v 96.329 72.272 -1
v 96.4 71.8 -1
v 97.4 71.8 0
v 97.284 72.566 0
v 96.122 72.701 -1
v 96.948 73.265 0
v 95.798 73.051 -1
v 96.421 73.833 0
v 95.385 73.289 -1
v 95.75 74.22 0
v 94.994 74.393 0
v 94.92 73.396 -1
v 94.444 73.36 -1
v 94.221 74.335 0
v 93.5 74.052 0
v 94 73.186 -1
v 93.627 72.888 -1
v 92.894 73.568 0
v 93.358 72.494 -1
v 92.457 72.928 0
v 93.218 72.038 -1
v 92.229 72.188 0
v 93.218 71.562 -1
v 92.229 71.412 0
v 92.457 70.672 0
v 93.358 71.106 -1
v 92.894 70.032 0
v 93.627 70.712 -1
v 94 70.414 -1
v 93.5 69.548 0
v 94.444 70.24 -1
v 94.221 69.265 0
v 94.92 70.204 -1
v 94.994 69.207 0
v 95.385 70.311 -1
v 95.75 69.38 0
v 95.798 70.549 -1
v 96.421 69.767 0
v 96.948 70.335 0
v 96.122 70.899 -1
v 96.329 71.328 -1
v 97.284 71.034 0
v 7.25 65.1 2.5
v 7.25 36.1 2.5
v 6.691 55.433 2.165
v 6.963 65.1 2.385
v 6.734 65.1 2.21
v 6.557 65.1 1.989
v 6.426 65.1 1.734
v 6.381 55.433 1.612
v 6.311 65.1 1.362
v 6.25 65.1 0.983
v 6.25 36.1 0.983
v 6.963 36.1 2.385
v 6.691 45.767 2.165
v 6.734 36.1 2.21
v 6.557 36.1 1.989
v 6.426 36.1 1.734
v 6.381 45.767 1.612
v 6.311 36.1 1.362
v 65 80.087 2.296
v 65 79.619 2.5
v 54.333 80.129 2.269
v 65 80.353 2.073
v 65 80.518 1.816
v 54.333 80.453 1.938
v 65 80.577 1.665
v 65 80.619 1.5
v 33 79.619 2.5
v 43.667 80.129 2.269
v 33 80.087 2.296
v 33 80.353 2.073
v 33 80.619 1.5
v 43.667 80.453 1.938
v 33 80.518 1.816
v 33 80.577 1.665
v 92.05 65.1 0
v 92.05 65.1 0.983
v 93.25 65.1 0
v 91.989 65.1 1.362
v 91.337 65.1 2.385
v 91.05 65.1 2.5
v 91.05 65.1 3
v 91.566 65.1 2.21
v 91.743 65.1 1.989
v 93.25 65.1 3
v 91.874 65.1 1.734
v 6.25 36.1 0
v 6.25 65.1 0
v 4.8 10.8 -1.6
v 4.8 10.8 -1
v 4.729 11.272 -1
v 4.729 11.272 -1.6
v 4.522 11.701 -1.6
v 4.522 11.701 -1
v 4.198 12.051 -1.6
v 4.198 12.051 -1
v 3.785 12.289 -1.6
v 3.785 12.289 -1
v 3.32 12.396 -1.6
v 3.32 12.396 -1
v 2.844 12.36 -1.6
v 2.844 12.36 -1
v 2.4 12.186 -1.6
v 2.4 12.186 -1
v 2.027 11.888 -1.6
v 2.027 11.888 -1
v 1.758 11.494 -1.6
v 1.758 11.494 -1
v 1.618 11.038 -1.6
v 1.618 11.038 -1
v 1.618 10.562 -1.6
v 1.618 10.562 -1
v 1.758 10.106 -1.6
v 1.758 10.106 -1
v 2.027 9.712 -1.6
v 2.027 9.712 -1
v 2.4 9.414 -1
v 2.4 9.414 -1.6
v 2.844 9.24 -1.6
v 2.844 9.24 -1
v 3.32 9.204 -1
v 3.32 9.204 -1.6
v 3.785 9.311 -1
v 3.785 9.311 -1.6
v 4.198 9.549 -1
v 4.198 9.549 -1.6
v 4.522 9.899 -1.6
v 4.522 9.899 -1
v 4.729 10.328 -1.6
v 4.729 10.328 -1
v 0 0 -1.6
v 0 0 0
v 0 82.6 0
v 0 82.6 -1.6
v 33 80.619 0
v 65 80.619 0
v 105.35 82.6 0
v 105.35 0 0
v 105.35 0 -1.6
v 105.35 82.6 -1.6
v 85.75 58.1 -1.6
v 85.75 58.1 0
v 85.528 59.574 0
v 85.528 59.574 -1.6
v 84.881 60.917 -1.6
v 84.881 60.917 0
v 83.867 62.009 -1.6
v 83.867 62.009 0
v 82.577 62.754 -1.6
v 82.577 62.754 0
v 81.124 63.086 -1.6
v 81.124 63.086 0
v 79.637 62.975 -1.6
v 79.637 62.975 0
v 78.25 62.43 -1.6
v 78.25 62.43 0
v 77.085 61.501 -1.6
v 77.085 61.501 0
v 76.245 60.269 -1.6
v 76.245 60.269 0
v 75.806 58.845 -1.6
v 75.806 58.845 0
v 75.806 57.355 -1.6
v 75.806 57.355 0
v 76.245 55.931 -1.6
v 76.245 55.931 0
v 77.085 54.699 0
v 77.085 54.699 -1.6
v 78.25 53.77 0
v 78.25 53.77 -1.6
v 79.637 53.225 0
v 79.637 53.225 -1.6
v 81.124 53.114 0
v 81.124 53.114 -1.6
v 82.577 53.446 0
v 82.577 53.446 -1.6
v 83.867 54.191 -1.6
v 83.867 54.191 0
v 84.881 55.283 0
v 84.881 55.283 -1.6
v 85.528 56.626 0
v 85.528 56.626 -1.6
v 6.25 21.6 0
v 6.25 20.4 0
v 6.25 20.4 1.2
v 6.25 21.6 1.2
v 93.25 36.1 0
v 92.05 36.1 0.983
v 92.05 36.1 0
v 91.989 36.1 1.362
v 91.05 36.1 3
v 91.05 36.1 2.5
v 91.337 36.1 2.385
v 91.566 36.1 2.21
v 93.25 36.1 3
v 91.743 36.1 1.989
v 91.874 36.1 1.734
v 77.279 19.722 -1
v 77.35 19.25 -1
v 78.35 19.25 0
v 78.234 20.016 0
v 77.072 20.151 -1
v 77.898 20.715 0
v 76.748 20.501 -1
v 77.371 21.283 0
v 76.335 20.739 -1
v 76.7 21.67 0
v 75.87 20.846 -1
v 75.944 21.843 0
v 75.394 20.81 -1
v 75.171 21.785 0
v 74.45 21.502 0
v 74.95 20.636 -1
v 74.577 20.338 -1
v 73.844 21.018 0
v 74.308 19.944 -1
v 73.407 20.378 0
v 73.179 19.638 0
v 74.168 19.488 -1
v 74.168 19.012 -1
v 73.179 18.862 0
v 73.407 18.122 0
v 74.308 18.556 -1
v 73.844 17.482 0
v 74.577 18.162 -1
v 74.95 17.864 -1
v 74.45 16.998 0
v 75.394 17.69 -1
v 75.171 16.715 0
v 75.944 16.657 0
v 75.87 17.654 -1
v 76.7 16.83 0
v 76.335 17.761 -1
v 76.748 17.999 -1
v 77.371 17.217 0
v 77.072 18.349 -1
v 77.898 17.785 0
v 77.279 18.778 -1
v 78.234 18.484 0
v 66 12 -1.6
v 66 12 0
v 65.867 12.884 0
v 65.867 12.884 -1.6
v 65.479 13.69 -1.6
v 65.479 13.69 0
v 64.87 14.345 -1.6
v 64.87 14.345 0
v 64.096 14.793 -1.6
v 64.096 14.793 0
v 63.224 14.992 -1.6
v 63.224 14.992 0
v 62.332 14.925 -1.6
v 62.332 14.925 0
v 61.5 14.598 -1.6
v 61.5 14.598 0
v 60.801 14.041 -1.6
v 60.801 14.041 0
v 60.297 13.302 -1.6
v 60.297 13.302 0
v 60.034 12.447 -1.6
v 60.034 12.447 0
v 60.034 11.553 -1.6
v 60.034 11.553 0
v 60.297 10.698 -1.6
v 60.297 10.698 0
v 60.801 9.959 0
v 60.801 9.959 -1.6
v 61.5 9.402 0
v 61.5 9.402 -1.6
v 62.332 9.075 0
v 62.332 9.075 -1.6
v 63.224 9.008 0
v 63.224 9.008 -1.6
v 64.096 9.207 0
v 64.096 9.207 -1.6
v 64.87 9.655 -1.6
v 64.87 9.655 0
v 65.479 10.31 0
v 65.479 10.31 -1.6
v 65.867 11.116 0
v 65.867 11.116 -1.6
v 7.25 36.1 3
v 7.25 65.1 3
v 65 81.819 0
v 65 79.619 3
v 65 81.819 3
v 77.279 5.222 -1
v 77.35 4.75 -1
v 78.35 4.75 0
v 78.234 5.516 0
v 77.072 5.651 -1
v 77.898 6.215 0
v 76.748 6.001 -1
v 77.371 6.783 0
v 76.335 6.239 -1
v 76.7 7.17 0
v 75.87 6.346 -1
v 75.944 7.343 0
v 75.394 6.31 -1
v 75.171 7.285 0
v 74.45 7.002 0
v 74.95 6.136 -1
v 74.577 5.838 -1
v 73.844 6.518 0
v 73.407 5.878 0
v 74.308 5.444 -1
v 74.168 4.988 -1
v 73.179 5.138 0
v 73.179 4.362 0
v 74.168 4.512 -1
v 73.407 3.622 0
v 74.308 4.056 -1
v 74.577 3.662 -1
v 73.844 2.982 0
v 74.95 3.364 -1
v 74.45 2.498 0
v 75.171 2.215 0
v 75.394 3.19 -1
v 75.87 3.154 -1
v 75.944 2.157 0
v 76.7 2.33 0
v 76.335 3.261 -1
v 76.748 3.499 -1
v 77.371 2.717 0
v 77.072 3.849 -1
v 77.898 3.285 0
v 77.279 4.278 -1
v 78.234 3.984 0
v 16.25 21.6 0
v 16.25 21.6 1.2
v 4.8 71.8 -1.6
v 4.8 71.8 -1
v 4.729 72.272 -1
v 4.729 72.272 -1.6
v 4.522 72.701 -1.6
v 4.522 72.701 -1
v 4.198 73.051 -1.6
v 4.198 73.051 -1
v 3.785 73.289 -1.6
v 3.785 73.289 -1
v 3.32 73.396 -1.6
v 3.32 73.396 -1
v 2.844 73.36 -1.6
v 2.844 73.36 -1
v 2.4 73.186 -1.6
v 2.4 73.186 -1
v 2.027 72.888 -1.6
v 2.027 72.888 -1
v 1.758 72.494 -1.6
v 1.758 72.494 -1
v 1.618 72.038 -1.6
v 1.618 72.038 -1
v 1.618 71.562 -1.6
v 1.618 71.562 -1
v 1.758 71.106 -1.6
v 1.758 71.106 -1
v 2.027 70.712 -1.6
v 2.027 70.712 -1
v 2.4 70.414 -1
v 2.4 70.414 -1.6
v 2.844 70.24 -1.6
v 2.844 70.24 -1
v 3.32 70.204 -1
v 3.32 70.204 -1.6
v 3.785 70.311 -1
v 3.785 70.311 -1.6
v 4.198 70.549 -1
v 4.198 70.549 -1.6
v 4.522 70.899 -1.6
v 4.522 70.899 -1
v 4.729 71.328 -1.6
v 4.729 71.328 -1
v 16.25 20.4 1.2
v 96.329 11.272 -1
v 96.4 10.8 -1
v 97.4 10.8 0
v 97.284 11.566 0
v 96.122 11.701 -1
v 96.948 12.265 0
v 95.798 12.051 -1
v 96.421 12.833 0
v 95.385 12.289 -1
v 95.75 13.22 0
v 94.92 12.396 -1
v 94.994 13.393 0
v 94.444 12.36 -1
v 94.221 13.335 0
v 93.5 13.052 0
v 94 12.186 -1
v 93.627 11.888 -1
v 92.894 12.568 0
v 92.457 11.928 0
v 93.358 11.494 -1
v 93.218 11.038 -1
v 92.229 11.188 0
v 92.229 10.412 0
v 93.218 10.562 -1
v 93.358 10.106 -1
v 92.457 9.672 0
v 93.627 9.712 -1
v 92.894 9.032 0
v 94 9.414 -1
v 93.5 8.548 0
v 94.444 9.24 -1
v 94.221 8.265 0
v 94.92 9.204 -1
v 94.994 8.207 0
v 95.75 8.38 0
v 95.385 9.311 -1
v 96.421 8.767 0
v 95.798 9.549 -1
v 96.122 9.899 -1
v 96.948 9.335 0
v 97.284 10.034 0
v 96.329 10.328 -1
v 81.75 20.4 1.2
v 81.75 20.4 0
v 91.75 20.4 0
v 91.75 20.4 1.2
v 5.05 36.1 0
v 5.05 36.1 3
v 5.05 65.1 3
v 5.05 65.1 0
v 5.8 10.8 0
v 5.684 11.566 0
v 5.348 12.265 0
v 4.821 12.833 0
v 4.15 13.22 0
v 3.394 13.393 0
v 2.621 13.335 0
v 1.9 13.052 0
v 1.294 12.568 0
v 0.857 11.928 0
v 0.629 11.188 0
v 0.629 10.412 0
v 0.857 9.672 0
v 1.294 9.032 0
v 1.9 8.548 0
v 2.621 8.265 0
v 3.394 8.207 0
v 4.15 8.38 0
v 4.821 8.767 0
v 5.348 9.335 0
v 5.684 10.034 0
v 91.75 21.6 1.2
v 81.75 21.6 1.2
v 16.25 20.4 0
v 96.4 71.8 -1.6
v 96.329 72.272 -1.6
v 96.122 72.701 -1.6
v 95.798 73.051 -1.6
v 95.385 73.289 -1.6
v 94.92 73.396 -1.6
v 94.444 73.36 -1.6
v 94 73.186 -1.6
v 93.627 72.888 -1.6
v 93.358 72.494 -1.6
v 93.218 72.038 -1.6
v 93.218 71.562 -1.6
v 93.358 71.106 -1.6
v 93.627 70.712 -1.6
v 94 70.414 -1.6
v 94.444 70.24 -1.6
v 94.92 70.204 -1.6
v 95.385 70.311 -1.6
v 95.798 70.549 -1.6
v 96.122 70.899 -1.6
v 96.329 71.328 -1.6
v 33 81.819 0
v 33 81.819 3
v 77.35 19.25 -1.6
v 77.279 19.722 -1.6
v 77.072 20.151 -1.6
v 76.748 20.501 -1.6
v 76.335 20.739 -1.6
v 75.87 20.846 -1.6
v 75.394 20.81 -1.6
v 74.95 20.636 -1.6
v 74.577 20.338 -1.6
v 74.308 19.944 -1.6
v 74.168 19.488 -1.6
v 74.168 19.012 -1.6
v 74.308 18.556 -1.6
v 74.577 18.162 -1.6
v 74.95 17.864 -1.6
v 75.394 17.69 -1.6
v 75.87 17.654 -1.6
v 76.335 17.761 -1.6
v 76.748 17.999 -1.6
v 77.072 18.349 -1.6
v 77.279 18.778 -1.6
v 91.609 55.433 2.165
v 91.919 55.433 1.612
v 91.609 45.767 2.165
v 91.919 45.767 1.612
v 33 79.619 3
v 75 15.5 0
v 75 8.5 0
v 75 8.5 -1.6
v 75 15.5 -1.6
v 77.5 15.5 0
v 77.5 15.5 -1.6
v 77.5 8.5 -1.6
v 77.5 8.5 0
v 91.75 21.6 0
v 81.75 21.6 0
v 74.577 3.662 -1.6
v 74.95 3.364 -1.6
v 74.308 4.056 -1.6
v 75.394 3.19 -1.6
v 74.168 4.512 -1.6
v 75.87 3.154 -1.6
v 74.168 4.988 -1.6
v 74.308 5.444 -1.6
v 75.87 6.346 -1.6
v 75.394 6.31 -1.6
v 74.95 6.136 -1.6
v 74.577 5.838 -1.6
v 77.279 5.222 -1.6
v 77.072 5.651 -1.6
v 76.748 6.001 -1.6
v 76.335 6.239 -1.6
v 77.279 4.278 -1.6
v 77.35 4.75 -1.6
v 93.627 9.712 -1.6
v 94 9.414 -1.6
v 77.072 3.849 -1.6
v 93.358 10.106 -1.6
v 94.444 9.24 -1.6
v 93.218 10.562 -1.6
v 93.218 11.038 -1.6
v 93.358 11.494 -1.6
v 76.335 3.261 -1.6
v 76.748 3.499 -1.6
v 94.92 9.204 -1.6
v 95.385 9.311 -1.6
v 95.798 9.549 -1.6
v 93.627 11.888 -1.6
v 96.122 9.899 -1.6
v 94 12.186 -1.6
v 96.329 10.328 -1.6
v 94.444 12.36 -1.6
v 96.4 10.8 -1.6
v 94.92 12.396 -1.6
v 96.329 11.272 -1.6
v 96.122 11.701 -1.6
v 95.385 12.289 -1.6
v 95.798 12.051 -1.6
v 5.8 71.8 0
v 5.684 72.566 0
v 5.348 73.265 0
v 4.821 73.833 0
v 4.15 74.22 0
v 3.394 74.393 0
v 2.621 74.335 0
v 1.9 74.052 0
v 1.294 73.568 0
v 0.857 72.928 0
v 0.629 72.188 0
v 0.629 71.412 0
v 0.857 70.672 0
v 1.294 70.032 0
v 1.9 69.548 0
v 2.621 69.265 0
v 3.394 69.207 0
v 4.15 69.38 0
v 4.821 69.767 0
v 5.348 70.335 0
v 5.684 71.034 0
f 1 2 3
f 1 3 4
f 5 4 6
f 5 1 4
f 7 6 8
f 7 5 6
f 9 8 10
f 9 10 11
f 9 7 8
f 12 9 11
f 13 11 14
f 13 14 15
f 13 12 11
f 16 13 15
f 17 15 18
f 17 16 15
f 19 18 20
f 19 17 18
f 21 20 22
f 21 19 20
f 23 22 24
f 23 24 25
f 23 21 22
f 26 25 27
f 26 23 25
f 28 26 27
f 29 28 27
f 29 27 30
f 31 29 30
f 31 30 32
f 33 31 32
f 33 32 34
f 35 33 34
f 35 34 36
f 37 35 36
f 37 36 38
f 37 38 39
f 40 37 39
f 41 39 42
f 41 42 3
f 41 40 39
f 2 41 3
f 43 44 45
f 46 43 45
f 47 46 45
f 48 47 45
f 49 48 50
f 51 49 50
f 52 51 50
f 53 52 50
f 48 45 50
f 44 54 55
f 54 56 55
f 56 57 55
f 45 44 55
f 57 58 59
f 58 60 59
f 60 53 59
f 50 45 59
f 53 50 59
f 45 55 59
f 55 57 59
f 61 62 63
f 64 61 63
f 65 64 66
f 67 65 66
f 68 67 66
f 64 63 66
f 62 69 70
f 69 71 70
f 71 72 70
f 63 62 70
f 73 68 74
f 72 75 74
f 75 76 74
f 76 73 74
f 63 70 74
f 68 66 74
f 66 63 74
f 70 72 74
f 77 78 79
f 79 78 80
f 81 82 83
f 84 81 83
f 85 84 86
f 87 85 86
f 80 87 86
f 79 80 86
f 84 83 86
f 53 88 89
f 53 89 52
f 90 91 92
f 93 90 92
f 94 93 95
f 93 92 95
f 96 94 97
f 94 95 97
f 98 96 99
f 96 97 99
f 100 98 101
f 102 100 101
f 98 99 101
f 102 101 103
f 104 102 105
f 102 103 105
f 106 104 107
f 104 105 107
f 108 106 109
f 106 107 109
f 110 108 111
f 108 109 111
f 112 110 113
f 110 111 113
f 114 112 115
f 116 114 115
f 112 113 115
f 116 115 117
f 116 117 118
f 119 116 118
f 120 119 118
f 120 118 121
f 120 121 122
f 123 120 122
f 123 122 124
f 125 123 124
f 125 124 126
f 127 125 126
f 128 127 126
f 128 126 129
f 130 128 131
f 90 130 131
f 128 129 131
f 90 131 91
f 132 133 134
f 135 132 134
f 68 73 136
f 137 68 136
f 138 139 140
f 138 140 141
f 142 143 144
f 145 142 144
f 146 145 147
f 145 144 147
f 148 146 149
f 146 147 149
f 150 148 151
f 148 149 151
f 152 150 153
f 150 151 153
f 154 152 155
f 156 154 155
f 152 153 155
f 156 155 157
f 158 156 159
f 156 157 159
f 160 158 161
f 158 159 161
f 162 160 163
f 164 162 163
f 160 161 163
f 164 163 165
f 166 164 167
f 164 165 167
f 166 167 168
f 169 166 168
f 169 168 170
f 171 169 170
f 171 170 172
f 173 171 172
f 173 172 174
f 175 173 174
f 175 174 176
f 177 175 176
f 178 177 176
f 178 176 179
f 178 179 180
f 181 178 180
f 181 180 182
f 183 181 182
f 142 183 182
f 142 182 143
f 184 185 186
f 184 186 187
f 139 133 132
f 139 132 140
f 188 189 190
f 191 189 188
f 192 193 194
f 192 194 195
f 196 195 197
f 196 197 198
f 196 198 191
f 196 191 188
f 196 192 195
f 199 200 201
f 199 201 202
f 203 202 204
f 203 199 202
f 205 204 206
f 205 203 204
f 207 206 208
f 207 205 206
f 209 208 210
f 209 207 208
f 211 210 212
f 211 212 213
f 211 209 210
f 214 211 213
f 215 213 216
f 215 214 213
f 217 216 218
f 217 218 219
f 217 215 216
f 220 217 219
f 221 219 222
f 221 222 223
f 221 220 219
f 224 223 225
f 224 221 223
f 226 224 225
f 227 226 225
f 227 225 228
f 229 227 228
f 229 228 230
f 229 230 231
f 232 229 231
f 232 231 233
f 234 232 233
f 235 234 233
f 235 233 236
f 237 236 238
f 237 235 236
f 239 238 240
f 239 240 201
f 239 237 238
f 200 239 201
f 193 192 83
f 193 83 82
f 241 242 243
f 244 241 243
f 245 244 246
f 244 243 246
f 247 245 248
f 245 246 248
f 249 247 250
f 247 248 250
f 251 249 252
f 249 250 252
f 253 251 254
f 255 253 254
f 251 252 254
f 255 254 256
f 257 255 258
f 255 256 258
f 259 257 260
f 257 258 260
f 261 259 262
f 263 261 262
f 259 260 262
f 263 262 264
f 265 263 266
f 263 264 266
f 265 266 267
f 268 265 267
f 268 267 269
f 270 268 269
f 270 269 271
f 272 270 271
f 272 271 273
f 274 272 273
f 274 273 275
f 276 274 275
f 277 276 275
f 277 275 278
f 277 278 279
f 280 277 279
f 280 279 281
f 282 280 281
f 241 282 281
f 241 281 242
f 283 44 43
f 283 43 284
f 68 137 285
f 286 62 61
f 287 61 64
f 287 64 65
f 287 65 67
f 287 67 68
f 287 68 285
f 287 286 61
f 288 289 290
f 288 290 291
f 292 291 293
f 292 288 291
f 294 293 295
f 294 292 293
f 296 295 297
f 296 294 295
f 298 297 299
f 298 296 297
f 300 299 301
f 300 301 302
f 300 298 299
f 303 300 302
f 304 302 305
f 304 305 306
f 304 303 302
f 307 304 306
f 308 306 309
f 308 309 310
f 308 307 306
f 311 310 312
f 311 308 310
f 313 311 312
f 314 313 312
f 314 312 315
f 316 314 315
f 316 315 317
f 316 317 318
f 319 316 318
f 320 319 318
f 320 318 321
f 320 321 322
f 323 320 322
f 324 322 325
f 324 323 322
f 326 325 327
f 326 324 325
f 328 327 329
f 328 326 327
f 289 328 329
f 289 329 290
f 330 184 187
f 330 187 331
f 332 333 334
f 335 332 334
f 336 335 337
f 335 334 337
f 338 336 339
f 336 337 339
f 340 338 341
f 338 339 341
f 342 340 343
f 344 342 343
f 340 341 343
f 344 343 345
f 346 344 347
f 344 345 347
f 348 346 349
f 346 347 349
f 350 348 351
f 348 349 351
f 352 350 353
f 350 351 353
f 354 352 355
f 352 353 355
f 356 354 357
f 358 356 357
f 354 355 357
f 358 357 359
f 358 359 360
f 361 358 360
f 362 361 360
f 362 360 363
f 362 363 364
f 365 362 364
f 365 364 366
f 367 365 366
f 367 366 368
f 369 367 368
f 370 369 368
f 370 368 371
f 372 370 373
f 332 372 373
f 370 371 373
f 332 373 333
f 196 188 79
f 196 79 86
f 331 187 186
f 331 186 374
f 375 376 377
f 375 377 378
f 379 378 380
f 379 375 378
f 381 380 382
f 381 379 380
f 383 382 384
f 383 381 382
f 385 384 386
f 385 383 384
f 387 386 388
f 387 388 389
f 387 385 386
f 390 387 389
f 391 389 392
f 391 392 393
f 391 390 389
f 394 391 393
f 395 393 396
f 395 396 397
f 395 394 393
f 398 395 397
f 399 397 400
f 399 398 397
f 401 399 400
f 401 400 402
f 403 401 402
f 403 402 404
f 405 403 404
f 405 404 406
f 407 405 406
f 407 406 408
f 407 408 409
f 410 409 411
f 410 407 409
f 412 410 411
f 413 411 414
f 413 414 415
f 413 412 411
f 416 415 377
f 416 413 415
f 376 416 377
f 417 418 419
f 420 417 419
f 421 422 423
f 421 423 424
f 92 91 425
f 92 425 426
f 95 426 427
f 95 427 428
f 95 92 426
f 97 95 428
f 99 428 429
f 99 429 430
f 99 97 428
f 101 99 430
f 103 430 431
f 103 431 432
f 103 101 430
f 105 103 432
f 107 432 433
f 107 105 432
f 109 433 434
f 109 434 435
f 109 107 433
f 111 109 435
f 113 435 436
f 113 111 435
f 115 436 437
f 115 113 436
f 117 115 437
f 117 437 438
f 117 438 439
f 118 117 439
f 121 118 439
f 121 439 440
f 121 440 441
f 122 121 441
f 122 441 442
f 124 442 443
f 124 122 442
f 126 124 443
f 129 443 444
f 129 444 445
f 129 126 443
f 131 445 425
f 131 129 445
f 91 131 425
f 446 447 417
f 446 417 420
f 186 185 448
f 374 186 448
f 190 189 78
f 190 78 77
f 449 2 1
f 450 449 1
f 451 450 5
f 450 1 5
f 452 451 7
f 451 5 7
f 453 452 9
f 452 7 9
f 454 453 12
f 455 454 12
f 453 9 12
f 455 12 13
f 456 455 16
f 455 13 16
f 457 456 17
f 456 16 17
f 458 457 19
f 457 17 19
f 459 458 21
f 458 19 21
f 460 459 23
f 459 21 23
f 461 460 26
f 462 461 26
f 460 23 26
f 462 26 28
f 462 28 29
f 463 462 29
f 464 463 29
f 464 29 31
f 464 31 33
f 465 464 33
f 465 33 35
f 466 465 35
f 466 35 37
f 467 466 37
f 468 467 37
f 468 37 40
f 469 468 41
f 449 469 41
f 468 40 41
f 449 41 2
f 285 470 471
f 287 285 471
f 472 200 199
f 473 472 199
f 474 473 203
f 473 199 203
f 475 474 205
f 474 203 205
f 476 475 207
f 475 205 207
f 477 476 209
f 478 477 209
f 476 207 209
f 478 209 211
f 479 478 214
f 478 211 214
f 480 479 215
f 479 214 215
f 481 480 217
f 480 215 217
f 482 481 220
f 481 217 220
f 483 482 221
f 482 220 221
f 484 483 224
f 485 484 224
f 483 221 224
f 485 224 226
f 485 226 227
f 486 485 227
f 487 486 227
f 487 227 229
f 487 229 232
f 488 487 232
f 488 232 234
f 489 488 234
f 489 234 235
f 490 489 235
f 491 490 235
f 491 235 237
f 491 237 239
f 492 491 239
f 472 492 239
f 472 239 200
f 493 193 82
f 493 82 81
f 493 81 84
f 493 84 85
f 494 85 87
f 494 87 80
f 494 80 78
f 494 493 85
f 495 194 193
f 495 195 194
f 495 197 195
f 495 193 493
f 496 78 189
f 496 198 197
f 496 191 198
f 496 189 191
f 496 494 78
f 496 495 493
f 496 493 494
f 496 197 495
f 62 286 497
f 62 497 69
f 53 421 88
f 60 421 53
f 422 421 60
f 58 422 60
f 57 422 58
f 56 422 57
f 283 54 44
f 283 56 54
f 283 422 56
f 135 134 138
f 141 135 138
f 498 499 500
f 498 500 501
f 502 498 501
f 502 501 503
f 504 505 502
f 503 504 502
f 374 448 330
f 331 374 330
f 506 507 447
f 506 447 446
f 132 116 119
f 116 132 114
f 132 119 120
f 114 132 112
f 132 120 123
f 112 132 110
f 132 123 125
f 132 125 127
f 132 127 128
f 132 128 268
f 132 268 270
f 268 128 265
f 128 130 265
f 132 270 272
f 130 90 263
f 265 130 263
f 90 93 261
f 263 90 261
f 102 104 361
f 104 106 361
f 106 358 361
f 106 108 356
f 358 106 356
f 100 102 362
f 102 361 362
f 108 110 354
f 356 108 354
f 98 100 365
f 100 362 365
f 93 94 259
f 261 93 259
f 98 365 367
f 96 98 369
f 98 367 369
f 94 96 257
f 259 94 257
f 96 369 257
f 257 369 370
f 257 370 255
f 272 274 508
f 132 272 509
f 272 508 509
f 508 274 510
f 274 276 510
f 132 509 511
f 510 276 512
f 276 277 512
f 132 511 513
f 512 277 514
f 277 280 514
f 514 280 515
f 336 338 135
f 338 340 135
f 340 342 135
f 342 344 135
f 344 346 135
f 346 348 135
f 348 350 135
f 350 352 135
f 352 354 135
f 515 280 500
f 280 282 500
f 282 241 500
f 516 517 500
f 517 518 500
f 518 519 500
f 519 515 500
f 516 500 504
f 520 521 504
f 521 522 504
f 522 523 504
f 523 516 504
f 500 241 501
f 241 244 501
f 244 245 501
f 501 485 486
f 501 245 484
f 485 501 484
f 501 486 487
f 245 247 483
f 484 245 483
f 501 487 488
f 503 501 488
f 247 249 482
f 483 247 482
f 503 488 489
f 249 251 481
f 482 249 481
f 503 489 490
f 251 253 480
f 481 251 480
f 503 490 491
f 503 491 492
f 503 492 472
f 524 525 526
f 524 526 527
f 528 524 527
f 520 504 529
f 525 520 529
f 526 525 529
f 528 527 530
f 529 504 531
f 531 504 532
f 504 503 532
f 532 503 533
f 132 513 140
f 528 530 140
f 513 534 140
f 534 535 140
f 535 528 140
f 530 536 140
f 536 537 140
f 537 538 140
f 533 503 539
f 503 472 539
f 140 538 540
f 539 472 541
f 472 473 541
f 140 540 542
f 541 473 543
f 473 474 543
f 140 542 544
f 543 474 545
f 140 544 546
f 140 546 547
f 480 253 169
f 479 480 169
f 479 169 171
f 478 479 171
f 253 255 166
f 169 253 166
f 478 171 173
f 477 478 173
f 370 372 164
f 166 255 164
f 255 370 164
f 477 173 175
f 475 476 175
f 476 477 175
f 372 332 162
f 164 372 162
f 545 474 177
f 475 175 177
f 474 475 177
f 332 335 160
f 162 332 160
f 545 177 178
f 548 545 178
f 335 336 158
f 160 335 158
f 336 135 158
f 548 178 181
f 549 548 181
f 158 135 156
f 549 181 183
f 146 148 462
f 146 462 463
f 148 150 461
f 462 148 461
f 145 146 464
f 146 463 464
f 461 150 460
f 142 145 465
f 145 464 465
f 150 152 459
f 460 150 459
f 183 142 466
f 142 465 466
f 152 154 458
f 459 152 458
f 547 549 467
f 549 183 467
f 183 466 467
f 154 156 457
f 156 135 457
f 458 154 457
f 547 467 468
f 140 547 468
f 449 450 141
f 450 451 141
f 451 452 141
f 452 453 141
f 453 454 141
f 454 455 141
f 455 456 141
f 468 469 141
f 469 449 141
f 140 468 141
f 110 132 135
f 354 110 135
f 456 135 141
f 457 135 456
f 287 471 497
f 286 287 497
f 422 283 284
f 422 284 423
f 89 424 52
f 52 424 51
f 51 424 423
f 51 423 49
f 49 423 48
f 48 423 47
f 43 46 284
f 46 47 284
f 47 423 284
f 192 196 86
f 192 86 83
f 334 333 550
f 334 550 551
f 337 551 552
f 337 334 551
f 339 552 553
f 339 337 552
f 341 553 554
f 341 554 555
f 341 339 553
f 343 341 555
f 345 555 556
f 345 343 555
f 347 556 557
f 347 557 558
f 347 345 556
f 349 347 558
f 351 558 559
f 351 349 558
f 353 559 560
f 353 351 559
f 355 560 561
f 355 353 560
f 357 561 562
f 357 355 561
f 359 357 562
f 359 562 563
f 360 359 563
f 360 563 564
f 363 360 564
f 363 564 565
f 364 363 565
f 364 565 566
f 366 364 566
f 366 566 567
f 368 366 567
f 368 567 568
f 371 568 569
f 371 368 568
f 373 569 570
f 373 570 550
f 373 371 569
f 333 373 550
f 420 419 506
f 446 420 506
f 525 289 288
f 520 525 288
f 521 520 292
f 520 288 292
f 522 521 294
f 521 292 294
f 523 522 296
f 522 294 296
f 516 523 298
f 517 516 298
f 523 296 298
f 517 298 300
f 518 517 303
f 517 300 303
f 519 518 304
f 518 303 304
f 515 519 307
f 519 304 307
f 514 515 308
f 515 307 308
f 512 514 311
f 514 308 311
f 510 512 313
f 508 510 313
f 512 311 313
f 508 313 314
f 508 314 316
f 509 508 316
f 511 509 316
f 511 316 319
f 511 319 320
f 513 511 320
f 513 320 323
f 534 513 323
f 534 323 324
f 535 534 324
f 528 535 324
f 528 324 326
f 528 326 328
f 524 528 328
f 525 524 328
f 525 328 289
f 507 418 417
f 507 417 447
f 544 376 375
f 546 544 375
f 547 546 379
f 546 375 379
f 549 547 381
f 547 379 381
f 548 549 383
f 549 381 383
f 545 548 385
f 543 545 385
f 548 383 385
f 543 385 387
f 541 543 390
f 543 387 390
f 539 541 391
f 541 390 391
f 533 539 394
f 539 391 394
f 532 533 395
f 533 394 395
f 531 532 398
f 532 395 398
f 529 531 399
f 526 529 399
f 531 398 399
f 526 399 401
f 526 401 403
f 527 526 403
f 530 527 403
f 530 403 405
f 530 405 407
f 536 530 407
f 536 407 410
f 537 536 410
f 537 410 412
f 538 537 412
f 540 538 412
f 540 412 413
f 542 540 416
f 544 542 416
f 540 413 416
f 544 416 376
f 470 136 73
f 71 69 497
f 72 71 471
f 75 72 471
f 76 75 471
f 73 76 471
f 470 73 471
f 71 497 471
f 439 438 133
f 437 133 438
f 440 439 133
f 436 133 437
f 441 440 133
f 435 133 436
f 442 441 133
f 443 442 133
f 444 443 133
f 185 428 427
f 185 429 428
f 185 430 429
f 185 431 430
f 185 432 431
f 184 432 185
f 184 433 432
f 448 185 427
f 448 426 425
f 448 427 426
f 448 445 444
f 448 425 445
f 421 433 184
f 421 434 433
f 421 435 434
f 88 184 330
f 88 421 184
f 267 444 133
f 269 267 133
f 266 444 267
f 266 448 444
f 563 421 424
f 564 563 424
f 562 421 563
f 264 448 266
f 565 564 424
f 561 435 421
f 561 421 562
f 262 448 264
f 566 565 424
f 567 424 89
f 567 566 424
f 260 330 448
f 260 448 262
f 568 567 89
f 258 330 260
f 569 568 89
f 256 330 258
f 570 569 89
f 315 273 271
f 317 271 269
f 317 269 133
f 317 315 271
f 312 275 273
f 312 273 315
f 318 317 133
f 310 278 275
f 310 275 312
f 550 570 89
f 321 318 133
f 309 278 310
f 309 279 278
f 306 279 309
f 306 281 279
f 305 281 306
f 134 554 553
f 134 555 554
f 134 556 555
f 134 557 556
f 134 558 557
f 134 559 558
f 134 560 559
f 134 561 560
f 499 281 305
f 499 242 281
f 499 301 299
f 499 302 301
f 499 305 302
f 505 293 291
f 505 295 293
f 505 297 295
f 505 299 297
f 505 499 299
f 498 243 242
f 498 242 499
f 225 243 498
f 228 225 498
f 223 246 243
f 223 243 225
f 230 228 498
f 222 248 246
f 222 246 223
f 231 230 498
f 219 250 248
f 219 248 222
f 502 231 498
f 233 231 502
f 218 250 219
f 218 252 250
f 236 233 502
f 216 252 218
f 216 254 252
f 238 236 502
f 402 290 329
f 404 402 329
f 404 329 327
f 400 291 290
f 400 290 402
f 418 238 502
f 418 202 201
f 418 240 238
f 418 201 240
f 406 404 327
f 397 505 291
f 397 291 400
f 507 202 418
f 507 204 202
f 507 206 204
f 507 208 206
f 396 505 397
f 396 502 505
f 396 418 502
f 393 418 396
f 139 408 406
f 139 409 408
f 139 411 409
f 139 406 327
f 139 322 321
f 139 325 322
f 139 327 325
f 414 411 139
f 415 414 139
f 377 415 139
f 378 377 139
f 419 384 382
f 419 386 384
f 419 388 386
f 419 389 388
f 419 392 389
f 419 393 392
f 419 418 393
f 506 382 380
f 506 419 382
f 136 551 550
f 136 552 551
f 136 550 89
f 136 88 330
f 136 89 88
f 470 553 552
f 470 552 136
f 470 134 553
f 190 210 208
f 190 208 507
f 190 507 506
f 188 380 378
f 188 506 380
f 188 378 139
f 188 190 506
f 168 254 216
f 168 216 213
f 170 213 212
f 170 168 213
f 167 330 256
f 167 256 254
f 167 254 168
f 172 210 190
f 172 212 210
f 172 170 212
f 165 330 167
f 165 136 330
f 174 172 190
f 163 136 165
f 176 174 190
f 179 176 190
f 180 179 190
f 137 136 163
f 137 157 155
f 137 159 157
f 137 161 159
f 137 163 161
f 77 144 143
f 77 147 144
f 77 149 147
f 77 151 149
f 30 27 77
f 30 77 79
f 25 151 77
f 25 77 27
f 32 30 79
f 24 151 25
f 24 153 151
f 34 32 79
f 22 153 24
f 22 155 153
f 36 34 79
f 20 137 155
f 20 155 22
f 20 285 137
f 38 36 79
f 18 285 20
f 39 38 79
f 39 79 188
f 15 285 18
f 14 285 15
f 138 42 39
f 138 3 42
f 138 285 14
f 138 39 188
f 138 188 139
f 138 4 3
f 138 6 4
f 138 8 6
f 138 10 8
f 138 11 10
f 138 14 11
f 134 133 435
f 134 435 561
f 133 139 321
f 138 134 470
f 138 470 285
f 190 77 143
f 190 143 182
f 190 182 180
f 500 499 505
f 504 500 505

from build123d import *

# Parameters (mm, degrees)
F0_W      = 105.35
F0_H      = 82.6
F0_R      = 1.6
F3_DEPTH  = 1.6
F1_R      = 5
F4_DEPTH  = 1.601
F2_R      = 1.6
F2_R_2    = 3
F2_W      = 2.5
F2_H      = 7
F5_DEPTH  = 1.601
F7_START  = -36.1
F7_DEPTH  = 29
F9_START  = 33
F9_DEPTH  = 32
F1_W      = 10
F1_H      = 1.2
F10_DEPTH = 1.2
F11_SIZE  = 1


with BuildPart() as f3:
    # F0 (on Top) → F3 (new body)
    with BuildSketch(Plane.XY):
        with Locations((52.675, 41.3)):
            Rectangle(F0_W, F0_H)
        with Locations((3.2, 10.8)):
            Circle(F0_R, mode=Mode.SUBTRACT)
        with Locations((94.8, 10.8)):
            Circle(F0_R, mode=Mode.SUBTRACT)
        with Locations((3.2, 71.8)):
            Circle(F0_R, mode=Mode.SUBTRACT)
        with Locations((94.8, 71.8)):
            Circle(F0_R, mode=Mode.SUBTRACT)
    extrude(amount=-F3_DEPTH)

    # F1 (on face) → F4 (cut, through all)
    with BuildSketch(Plane.XY):
        with Locations((80.75, 58.1)):
            Circle(F1_R)
    extrude(amount=-F4_DEPTH, mode=Mode.SUBTRACT)

    # F2 (on face) → F5 (cut, through all)
    with BuildSketch(Plane.XY):
        with Locations((75.75, 4.75)):
            Circle(F2_R)
        with Locations((63, 12)):
            Circle(F2_R_2)
        with Locations((76.25, 12)):
            Rectangle(F2_W, F2_H)
        with Locations((75.75, 19.25)):
            Circle(F2_R)
    extrude(amount=-F5_DEPTH, mode=Mode.SUBTRACT)

    # F6 (on Front) → F7 (join)
    with BuildSketch(Plane.XZ.offset(F7_START)):
        with BuildLine():
            add(Edge.make_bspline(
                [(6.25, 0.9831411553), (6.1998556443, 0.4976120788), (6.25, 0.0696883488), (6.25, 0)],
                knots=[1.5113210061, 1.5113210061, 1.5113210061, 1.5113210061, 2.6925824036, 2.6925824036, 2.6925824036, 2.6925824036], degree=3))
            Line((6.25, 0), (6.25, 0.9831411553))
        make_face()
        with BuildLine():
            Line((5.05, 0), (6.25, 0))
            add(Edge.make_bspline(
                [(6.25, 0.9831411553), (6.1998556443, 0.4976120788), (6.25, 0.0696883488), (6.25, 0)],
                knots=[1.5113210061, 1.5113210061, 1.5113210061, 1.5113210061, 2.6925824036, 2.6925824036, 2.6925824036, 2.6925824036], degree=3))
            Line((6.25, 0.9831411553), (6.25, 3))
            Line((6.25, 3), (5.05, 3))
            Line((5.05, 3), (5.05, 0))
        make_face()
        with BuildLine():
            Line((6.25, 3), (6.25, 0.9831411553))
            add(Edge.make_bspline(
                [(7.25, 2.5), (6.5424729796, 2.3198194624), (6.3141553328, 1.6043332928), (6.25, 0.9831411553)],
                knots=[0, 0, 0, 0, 1.5113210061, 1.5113210061, 1.5113210061, 1.5113210061], degree=3))
            Line((7.25, 2.5), (7.25, 3))
            Line((7.25, 3), (6.25, 3))
        make_face()
        with BuildLine():
            Line((92.05, 0.9831411553), (92.05, 3))
            Line((92.05, 3), (91.05, 3))
            Line((91.05, 3), (91.05, 2.5))
            add(Edge.make_bspline(
                [(91.05, 2.5), (91.7575270204, 2.3198194624), (91.9858446672, 1.6043332928), (92.05, 0.9831411553)],
                knots=[0, 0, 0, 0, 1.5113210061, 1.5113210061, 1.5113210061, 1.5113210061], degree=3))
        make_face()
        with BuildLine():
            Line((93.25, 3), (92.05, 3))
            Line((92.05, 3), (92.05, 0.9831411553))
            add(Edge.make_bspline(
                [(92.05, 0.9831411553), (92.1001443557, 0.4976120788), (92.05, 0.0696883488), (92.05, 0)],
                knots=[1.5113210061, 1.5113210061, 1.5113210061, 1.5113210061, 2.6925824036, 2.6925824036, 2.6925824036, 2.6925824036], degree=3))
            Line((92.05, 0), (93.25, 0))
            Line((93.25, 0), (93.25, 3))
        make_face()
        with BuildLine():
            add(Edge.make_bspline(
                [(92.05, 0.9831411553), (92.1001443557, 0.4976120788), (92.05, 0.0696883488), (92.05, 0)],
                knots=[1.5113210061, 1.5113210061, 1.5113210061, 1.5113210061, 2.6925824036, 2.6925824036, 2.6925824036, 2.6925824036], degree=3))
            Line((92.05, 0.9831411553), (92.05, 0))
        make_face()
    extrude(amount=-F7_DEPTH)

    # F8 (on Right) → F9 (join)
    with BuildSketch(Plane.YZ.offset(F9_START)):
        with BuildLine():
            add(Edge.make_bspline(
                [(80.6190222502, 1.5), (80.7199138112, 0.9911874772), (80.6190222502, 0.2993458475), (80.6190222502, 0)],
                knots=[0.4926390921, 0.4926390921, 0.4926390921, 0.4926390921, 1, 1, 1, 1], degree=3))
            Line((80.6190222502, 0), (81.8190222502, 0))
            Line((81.8190222502, 0), (81.8190222502, 3))
            Line((81.8190222502, 3), (80.6190222502, 3))
            Line((80.6190222502, 3), (80.6190222502, 1.5))
        make_face()
        with BuildLine():
            Line((80.6190222502, 1.5), (80.6190222502, 0))
            add(Edge.make_bspline(
                [(80.6190222502, 1.5), (80.7199138112, 0.9911874772), (80.6190222502, 0.2993458475), (80.6190222502, 0)],
                knots=[0.4926390921, 0.4926390921, 0.4926390921, 0.4926390921, 1, 1, 1, 1], degree=3))
        make_face()
        with BuildLine():
            add(Edge.make_bspline(
                [(79.6190222502, 2.5), (80.2328512073, 2.3155356757), (80.5210582047, 1.9940485863), (80.6190222502, 1.5)],
                knots=[0, 0, 0, 0, 0.4926390921, 0.4926390921, 0.4926390921, 0.4926390921], degree=3))
            Line((80.6190222502, 1.5), (80.6190222502, 3))
            Line((80.6190222502, 3), (79.6190222502, 3))
            Line((79.6190222502, 3), (79.6190222502, 2.5))
        make_face()
    extrude(amount=F9_DEPTH)

    # F1 (on face) → F10 (join)
    with BuildSketch(Plane.XY):
        with Locations((11.25, 21)):
            Rectangle(F1_W, F1_H)
        with Locations((86.75, 21)):
            Rectangle(F1_W, F1_H)
    extrude(amount=F10_DEPTH)

    # F11
    f11_edges = [f3.edges().sort_by_distance(p)[0] for p in [
        (1.6, 71.8, 0),
        (93.2, 71.8, 0),
        (93.2, 10.8, 0),
        (74.15, 19.25, 0),
        (74.15, 4.75, 0),
        (1.6, 10.8, 0),
    ]]
    chamfer(f11_edges, length=F11_SIZE)


solid = f3.part
